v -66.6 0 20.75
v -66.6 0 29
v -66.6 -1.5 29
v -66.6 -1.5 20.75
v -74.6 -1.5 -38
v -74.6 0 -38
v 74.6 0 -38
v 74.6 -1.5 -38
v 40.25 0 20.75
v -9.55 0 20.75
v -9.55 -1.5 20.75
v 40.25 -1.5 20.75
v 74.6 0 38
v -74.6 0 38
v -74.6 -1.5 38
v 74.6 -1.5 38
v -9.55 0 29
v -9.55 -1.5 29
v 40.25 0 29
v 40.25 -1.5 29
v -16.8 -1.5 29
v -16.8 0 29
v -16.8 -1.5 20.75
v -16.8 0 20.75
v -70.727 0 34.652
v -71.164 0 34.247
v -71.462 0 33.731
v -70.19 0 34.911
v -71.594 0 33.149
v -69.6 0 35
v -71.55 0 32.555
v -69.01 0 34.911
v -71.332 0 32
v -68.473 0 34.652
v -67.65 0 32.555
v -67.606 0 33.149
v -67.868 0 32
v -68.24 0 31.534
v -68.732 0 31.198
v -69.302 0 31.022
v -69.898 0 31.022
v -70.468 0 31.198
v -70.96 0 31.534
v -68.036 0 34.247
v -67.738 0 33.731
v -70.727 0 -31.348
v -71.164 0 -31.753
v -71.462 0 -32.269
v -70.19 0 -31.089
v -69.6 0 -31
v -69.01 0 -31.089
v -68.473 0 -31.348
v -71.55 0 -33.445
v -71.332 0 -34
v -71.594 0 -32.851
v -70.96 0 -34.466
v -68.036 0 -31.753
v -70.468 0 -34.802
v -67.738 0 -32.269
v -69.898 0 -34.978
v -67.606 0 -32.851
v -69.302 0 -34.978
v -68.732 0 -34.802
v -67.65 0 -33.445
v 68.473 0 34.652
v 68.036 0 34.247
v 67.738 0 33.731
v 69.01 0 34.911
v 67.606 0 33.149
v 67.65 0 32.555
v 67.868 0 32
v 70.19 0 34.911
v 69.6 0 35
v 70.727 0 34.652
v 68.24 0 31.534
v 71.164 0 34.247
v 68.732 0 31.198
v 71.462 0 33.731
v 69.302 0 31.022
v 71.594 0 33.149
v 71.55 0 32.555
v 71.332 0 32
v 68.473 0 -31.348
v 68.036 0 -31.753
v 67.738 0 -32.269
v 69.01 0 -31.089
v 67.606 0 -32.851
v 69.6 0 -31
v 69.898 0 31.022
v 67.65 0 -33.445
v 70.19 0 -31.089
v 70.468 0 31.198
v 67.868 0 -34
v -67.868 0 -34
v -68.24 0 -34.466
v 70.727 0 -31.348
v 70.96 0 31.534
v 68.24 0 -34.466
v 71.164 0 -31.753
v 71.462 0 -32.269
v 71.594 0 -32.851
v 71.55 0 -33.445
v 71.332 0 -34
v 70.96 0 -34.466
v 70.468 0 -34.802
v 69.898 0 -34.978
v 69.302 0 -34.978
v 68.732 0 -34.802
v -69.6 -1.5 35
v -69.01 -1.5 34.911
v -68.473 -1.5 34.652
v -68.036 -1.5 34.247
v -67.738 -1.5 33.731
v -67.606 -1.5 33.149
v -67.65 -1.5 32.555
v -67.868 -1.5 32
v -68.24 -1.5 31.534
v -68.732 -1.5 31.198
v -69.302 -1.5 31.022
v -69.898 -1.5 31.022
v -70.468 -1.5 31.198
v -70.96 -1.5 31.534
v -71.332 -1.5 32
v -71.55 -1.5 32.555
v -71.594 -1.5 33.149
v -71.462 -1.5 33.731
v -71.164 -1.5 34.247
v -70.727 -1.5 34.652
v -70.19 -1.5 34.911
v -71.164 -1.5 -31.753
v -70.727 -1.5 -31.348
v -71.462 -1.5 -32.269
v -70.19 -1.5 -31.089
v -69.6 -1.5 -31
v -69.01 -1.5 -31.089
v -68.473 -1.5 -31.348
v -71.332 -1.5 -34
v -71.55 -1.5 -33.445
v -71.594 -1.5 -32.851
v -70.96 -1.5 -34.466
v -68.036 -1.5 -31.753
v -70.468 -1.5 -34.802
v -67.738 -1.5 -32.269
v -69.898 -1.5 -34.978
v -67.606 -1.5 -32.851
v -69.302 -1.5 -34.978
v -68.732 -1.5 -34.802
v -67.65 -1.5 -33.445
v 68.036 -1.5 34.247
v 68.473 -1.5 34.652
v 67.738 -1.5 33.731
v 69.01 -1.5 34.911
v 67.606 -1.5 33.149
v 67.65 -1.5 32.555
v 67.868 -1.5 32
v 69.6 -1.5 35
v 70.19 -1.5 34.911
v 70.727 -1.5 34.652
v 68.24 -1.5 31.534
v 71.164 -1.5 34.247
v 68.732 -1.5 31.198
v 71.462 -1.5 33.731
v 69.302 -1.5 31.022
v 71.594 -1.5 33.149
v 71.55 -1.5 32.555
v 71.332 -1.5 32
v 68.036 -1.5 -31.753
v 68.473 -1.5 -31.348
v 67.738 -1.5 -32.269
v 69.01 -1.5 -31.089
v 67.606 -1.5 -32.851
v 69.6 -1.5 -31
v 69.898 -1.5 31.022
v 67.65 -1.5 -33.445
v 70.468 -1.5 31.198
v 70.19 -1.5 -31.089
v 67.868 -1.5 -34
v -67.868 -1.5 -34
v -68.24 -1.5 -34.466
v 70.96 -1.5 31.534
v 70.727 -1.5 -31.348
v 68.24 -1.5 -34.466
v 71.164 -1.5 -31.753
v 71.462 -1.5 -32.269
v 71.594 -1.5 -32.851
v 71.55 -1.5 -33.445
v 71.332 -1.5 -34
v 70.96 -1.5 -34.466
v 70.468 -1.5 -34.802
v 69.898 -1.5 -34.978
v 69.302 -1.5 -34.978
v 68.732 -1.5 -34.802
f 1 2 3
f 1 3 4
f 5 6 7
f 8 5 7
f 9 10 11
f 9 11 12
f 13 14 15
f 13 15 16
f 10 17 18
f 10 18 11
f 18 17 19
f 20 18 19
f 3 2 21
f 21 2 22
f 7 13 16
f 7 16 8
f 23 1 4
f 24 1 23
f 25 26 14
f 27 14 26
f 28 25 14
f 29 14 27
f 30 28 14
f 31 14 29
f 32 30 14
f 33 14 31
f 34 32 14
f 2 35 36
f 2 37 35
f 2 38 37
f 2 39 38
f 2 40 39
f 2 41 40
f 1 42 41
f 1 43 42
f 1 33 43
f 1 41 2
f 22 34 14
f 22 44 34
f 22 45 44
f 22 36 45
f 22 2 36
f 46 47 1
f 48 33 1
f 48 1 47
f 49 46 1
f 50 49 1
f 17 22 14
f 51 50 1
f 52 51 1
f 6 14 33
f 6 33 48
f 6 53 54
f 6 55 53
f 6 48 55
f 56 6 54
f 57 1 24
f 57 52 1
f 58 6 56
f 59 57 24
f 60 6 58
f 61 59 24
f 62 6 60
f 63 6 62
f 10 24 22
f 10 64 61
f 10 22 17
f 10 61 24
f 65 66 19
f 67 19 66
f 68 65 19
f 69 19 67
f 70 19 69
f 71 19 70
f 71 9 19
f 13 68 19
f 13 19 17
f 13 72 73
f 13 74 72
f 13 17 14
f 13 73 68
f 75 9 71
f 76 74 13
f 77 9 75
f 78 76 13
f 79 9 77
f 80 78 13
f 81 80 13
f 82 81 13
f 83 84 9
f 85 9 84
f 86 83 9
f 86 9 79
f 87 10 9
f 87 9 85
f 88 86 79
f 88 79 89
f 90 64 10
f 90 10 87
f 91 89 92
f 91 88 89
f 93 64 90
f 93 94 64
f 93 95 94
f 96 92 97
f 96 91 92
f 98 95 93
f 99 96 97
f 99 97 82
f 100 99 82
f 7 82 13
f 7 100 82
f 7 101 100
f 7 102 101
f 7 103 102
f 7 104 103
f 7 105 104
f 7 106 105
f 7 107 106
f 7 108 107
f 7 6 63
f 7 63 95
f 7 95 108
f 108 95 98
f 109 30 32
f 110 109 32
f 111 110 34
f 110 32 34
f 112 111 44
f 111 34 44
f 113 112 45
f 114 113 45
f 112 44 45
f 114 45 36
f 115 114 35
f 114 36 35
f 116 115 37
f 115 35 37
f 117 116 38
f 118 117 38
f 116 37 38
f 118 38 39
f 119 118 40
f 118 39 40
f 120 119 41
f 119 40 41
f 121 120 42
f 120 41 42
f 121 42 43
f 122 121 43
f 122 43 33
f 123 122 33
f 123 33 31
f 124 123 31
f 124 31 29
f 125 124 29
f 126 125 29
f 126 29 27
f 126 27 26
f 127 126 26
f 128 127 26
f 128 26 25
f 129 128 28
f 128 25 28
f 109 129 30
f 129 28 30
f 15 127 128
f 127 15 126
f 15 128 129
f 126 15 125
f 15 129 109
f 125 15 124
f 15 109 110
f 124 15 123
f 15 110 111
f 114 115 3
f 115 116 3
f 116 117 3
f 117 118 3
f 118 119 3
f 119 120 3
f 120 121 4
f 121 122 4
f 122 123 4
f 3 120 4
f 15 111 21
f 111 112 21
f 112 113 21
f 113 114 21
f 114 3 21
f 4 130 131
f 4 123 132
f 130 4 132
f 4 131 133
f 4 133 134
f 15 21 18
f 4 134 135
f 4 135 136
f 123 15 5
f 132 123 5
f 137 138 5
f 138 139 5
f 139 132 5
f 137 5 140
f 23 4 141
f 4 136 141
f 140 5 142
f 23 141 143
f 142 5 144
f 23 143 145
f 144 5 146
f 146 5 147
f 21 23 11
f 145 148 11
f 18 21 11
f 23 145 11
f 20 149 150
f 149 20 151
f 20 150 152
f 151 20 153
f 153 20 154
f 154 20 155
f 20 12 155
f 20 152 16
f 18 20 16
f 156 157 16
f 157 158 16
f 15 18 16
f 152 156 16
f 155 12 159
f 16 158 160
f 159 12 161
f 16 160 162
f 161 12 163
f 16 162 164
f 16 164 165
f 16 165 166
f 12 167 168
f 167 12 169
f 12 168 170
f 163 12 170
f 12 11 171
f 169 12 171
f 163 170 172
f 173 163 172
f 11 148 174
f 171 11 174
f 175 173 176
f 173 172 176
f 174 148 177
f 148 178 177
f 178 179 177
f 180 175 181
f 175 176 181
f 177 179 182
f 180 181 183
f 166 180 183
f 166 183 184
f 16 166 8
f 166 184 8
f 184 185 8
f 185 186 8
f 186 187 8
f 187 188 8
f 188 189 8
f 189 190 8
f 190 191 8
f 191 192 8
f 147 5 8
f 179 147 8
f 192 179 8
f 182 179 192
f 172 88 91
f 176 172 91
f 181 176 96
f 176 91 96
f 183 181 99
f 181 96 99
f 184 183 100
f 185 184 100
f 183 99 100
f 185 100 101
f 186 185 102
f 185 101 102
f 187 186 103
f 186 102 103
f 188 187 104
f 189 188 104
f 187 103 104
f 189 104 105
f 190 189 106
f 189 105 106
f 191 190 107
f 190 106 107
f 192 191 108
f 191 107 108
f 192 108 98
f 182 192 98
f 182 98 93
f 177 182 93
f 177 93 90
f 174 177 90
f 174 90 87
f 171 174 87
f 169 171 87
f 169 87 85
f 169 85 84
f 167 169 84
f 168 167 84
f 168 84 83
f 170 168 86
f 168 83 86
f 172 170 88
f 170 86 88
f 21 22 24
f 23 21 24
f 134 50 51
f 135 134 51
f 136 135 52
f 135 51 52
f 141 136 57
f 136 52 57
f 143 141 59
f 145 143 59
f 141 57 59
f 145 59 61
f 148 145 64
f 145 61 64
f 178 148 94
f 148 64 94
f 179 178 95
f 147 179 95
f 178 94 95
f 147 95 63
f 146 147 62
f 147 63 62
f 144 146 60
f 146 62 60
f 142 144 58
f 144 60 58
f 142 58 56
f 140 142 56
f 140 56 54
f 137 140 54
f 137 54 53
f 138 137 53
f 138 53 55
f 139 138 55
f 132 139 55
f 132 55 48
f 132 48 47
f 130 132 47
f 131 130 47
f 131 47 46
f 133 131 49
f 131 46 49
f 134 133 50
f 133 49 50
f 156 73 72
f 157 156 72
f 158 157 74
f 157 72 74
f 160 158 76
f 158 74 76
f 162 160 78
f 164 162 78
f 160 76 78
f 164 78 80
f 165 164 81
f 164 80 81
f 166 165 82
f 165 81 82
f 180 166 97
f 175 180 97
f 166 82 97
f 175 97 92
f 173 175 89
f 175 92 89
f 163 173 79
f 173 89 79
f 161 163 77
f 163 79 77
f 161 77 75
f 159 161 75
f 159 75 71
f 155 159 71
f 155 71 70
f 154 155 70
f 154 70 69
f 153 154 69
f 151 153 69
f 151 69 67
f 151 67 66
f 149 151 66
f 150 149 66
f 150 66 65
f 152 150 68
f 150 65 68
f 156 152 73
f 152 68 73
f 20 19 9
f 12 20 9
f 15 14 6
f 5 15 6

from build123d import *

# Parameters (mm, degrees)
SKETCH1_W           = 149.2
SKETCH1_H           = 76
SKETCH1_R           = 2
SKETCH1_W_2         = 49.8
SKETCH1_H_2         = 8.25
BOSS_EXTRUDE1_DEPTH = 1.5


with BuildPart() as part:
    # Sketch1 → Boss-Extrude1 (new body)
    with BuildSketch(Plane(origin=(0, 0, 0), x_dir=(1, 0, 0), z_dir=(0, 1, 0))):
        Rectangle(SKETCH1_W, SKETCH1_H)
        with Locations(Location((-69.6, 33, 0), (0, 0, 270))):
            Circle(SKETCH1_R, mode=Mode.SUBTRACT)
        with Locations(Location((69.6, 33, 0), (0, 0, 270))):
            Circle(SKETCH1_R, mode=Mode.SUBTRACT)
        with Locations(Location((69.6, -33, 0), (0, 0, 270))):
            Circle(SKETCH1_R, mode=Mode.SUBTRACT)
        with Locations(Location((-69.6, -33, 0), (0, 0, 270))):
            Circle(SKETCH1_R, mode=Mode.SUBTRACT)
        with Locations((-41.7, -24.875)):
            Rectangle(SKETCH1_W_2, SKETCH1_H_2, mode=Mode.SUBTRACT)
        with Locations((15.35, -24.875)):
            Rectangle(SKETCH1_W_2, SKETCH1_H_2, mode=Mode.SUBTRACT)
    extrude(amount=-BOSS_EXTRUDE1_DEPTH)


solid = part.part
